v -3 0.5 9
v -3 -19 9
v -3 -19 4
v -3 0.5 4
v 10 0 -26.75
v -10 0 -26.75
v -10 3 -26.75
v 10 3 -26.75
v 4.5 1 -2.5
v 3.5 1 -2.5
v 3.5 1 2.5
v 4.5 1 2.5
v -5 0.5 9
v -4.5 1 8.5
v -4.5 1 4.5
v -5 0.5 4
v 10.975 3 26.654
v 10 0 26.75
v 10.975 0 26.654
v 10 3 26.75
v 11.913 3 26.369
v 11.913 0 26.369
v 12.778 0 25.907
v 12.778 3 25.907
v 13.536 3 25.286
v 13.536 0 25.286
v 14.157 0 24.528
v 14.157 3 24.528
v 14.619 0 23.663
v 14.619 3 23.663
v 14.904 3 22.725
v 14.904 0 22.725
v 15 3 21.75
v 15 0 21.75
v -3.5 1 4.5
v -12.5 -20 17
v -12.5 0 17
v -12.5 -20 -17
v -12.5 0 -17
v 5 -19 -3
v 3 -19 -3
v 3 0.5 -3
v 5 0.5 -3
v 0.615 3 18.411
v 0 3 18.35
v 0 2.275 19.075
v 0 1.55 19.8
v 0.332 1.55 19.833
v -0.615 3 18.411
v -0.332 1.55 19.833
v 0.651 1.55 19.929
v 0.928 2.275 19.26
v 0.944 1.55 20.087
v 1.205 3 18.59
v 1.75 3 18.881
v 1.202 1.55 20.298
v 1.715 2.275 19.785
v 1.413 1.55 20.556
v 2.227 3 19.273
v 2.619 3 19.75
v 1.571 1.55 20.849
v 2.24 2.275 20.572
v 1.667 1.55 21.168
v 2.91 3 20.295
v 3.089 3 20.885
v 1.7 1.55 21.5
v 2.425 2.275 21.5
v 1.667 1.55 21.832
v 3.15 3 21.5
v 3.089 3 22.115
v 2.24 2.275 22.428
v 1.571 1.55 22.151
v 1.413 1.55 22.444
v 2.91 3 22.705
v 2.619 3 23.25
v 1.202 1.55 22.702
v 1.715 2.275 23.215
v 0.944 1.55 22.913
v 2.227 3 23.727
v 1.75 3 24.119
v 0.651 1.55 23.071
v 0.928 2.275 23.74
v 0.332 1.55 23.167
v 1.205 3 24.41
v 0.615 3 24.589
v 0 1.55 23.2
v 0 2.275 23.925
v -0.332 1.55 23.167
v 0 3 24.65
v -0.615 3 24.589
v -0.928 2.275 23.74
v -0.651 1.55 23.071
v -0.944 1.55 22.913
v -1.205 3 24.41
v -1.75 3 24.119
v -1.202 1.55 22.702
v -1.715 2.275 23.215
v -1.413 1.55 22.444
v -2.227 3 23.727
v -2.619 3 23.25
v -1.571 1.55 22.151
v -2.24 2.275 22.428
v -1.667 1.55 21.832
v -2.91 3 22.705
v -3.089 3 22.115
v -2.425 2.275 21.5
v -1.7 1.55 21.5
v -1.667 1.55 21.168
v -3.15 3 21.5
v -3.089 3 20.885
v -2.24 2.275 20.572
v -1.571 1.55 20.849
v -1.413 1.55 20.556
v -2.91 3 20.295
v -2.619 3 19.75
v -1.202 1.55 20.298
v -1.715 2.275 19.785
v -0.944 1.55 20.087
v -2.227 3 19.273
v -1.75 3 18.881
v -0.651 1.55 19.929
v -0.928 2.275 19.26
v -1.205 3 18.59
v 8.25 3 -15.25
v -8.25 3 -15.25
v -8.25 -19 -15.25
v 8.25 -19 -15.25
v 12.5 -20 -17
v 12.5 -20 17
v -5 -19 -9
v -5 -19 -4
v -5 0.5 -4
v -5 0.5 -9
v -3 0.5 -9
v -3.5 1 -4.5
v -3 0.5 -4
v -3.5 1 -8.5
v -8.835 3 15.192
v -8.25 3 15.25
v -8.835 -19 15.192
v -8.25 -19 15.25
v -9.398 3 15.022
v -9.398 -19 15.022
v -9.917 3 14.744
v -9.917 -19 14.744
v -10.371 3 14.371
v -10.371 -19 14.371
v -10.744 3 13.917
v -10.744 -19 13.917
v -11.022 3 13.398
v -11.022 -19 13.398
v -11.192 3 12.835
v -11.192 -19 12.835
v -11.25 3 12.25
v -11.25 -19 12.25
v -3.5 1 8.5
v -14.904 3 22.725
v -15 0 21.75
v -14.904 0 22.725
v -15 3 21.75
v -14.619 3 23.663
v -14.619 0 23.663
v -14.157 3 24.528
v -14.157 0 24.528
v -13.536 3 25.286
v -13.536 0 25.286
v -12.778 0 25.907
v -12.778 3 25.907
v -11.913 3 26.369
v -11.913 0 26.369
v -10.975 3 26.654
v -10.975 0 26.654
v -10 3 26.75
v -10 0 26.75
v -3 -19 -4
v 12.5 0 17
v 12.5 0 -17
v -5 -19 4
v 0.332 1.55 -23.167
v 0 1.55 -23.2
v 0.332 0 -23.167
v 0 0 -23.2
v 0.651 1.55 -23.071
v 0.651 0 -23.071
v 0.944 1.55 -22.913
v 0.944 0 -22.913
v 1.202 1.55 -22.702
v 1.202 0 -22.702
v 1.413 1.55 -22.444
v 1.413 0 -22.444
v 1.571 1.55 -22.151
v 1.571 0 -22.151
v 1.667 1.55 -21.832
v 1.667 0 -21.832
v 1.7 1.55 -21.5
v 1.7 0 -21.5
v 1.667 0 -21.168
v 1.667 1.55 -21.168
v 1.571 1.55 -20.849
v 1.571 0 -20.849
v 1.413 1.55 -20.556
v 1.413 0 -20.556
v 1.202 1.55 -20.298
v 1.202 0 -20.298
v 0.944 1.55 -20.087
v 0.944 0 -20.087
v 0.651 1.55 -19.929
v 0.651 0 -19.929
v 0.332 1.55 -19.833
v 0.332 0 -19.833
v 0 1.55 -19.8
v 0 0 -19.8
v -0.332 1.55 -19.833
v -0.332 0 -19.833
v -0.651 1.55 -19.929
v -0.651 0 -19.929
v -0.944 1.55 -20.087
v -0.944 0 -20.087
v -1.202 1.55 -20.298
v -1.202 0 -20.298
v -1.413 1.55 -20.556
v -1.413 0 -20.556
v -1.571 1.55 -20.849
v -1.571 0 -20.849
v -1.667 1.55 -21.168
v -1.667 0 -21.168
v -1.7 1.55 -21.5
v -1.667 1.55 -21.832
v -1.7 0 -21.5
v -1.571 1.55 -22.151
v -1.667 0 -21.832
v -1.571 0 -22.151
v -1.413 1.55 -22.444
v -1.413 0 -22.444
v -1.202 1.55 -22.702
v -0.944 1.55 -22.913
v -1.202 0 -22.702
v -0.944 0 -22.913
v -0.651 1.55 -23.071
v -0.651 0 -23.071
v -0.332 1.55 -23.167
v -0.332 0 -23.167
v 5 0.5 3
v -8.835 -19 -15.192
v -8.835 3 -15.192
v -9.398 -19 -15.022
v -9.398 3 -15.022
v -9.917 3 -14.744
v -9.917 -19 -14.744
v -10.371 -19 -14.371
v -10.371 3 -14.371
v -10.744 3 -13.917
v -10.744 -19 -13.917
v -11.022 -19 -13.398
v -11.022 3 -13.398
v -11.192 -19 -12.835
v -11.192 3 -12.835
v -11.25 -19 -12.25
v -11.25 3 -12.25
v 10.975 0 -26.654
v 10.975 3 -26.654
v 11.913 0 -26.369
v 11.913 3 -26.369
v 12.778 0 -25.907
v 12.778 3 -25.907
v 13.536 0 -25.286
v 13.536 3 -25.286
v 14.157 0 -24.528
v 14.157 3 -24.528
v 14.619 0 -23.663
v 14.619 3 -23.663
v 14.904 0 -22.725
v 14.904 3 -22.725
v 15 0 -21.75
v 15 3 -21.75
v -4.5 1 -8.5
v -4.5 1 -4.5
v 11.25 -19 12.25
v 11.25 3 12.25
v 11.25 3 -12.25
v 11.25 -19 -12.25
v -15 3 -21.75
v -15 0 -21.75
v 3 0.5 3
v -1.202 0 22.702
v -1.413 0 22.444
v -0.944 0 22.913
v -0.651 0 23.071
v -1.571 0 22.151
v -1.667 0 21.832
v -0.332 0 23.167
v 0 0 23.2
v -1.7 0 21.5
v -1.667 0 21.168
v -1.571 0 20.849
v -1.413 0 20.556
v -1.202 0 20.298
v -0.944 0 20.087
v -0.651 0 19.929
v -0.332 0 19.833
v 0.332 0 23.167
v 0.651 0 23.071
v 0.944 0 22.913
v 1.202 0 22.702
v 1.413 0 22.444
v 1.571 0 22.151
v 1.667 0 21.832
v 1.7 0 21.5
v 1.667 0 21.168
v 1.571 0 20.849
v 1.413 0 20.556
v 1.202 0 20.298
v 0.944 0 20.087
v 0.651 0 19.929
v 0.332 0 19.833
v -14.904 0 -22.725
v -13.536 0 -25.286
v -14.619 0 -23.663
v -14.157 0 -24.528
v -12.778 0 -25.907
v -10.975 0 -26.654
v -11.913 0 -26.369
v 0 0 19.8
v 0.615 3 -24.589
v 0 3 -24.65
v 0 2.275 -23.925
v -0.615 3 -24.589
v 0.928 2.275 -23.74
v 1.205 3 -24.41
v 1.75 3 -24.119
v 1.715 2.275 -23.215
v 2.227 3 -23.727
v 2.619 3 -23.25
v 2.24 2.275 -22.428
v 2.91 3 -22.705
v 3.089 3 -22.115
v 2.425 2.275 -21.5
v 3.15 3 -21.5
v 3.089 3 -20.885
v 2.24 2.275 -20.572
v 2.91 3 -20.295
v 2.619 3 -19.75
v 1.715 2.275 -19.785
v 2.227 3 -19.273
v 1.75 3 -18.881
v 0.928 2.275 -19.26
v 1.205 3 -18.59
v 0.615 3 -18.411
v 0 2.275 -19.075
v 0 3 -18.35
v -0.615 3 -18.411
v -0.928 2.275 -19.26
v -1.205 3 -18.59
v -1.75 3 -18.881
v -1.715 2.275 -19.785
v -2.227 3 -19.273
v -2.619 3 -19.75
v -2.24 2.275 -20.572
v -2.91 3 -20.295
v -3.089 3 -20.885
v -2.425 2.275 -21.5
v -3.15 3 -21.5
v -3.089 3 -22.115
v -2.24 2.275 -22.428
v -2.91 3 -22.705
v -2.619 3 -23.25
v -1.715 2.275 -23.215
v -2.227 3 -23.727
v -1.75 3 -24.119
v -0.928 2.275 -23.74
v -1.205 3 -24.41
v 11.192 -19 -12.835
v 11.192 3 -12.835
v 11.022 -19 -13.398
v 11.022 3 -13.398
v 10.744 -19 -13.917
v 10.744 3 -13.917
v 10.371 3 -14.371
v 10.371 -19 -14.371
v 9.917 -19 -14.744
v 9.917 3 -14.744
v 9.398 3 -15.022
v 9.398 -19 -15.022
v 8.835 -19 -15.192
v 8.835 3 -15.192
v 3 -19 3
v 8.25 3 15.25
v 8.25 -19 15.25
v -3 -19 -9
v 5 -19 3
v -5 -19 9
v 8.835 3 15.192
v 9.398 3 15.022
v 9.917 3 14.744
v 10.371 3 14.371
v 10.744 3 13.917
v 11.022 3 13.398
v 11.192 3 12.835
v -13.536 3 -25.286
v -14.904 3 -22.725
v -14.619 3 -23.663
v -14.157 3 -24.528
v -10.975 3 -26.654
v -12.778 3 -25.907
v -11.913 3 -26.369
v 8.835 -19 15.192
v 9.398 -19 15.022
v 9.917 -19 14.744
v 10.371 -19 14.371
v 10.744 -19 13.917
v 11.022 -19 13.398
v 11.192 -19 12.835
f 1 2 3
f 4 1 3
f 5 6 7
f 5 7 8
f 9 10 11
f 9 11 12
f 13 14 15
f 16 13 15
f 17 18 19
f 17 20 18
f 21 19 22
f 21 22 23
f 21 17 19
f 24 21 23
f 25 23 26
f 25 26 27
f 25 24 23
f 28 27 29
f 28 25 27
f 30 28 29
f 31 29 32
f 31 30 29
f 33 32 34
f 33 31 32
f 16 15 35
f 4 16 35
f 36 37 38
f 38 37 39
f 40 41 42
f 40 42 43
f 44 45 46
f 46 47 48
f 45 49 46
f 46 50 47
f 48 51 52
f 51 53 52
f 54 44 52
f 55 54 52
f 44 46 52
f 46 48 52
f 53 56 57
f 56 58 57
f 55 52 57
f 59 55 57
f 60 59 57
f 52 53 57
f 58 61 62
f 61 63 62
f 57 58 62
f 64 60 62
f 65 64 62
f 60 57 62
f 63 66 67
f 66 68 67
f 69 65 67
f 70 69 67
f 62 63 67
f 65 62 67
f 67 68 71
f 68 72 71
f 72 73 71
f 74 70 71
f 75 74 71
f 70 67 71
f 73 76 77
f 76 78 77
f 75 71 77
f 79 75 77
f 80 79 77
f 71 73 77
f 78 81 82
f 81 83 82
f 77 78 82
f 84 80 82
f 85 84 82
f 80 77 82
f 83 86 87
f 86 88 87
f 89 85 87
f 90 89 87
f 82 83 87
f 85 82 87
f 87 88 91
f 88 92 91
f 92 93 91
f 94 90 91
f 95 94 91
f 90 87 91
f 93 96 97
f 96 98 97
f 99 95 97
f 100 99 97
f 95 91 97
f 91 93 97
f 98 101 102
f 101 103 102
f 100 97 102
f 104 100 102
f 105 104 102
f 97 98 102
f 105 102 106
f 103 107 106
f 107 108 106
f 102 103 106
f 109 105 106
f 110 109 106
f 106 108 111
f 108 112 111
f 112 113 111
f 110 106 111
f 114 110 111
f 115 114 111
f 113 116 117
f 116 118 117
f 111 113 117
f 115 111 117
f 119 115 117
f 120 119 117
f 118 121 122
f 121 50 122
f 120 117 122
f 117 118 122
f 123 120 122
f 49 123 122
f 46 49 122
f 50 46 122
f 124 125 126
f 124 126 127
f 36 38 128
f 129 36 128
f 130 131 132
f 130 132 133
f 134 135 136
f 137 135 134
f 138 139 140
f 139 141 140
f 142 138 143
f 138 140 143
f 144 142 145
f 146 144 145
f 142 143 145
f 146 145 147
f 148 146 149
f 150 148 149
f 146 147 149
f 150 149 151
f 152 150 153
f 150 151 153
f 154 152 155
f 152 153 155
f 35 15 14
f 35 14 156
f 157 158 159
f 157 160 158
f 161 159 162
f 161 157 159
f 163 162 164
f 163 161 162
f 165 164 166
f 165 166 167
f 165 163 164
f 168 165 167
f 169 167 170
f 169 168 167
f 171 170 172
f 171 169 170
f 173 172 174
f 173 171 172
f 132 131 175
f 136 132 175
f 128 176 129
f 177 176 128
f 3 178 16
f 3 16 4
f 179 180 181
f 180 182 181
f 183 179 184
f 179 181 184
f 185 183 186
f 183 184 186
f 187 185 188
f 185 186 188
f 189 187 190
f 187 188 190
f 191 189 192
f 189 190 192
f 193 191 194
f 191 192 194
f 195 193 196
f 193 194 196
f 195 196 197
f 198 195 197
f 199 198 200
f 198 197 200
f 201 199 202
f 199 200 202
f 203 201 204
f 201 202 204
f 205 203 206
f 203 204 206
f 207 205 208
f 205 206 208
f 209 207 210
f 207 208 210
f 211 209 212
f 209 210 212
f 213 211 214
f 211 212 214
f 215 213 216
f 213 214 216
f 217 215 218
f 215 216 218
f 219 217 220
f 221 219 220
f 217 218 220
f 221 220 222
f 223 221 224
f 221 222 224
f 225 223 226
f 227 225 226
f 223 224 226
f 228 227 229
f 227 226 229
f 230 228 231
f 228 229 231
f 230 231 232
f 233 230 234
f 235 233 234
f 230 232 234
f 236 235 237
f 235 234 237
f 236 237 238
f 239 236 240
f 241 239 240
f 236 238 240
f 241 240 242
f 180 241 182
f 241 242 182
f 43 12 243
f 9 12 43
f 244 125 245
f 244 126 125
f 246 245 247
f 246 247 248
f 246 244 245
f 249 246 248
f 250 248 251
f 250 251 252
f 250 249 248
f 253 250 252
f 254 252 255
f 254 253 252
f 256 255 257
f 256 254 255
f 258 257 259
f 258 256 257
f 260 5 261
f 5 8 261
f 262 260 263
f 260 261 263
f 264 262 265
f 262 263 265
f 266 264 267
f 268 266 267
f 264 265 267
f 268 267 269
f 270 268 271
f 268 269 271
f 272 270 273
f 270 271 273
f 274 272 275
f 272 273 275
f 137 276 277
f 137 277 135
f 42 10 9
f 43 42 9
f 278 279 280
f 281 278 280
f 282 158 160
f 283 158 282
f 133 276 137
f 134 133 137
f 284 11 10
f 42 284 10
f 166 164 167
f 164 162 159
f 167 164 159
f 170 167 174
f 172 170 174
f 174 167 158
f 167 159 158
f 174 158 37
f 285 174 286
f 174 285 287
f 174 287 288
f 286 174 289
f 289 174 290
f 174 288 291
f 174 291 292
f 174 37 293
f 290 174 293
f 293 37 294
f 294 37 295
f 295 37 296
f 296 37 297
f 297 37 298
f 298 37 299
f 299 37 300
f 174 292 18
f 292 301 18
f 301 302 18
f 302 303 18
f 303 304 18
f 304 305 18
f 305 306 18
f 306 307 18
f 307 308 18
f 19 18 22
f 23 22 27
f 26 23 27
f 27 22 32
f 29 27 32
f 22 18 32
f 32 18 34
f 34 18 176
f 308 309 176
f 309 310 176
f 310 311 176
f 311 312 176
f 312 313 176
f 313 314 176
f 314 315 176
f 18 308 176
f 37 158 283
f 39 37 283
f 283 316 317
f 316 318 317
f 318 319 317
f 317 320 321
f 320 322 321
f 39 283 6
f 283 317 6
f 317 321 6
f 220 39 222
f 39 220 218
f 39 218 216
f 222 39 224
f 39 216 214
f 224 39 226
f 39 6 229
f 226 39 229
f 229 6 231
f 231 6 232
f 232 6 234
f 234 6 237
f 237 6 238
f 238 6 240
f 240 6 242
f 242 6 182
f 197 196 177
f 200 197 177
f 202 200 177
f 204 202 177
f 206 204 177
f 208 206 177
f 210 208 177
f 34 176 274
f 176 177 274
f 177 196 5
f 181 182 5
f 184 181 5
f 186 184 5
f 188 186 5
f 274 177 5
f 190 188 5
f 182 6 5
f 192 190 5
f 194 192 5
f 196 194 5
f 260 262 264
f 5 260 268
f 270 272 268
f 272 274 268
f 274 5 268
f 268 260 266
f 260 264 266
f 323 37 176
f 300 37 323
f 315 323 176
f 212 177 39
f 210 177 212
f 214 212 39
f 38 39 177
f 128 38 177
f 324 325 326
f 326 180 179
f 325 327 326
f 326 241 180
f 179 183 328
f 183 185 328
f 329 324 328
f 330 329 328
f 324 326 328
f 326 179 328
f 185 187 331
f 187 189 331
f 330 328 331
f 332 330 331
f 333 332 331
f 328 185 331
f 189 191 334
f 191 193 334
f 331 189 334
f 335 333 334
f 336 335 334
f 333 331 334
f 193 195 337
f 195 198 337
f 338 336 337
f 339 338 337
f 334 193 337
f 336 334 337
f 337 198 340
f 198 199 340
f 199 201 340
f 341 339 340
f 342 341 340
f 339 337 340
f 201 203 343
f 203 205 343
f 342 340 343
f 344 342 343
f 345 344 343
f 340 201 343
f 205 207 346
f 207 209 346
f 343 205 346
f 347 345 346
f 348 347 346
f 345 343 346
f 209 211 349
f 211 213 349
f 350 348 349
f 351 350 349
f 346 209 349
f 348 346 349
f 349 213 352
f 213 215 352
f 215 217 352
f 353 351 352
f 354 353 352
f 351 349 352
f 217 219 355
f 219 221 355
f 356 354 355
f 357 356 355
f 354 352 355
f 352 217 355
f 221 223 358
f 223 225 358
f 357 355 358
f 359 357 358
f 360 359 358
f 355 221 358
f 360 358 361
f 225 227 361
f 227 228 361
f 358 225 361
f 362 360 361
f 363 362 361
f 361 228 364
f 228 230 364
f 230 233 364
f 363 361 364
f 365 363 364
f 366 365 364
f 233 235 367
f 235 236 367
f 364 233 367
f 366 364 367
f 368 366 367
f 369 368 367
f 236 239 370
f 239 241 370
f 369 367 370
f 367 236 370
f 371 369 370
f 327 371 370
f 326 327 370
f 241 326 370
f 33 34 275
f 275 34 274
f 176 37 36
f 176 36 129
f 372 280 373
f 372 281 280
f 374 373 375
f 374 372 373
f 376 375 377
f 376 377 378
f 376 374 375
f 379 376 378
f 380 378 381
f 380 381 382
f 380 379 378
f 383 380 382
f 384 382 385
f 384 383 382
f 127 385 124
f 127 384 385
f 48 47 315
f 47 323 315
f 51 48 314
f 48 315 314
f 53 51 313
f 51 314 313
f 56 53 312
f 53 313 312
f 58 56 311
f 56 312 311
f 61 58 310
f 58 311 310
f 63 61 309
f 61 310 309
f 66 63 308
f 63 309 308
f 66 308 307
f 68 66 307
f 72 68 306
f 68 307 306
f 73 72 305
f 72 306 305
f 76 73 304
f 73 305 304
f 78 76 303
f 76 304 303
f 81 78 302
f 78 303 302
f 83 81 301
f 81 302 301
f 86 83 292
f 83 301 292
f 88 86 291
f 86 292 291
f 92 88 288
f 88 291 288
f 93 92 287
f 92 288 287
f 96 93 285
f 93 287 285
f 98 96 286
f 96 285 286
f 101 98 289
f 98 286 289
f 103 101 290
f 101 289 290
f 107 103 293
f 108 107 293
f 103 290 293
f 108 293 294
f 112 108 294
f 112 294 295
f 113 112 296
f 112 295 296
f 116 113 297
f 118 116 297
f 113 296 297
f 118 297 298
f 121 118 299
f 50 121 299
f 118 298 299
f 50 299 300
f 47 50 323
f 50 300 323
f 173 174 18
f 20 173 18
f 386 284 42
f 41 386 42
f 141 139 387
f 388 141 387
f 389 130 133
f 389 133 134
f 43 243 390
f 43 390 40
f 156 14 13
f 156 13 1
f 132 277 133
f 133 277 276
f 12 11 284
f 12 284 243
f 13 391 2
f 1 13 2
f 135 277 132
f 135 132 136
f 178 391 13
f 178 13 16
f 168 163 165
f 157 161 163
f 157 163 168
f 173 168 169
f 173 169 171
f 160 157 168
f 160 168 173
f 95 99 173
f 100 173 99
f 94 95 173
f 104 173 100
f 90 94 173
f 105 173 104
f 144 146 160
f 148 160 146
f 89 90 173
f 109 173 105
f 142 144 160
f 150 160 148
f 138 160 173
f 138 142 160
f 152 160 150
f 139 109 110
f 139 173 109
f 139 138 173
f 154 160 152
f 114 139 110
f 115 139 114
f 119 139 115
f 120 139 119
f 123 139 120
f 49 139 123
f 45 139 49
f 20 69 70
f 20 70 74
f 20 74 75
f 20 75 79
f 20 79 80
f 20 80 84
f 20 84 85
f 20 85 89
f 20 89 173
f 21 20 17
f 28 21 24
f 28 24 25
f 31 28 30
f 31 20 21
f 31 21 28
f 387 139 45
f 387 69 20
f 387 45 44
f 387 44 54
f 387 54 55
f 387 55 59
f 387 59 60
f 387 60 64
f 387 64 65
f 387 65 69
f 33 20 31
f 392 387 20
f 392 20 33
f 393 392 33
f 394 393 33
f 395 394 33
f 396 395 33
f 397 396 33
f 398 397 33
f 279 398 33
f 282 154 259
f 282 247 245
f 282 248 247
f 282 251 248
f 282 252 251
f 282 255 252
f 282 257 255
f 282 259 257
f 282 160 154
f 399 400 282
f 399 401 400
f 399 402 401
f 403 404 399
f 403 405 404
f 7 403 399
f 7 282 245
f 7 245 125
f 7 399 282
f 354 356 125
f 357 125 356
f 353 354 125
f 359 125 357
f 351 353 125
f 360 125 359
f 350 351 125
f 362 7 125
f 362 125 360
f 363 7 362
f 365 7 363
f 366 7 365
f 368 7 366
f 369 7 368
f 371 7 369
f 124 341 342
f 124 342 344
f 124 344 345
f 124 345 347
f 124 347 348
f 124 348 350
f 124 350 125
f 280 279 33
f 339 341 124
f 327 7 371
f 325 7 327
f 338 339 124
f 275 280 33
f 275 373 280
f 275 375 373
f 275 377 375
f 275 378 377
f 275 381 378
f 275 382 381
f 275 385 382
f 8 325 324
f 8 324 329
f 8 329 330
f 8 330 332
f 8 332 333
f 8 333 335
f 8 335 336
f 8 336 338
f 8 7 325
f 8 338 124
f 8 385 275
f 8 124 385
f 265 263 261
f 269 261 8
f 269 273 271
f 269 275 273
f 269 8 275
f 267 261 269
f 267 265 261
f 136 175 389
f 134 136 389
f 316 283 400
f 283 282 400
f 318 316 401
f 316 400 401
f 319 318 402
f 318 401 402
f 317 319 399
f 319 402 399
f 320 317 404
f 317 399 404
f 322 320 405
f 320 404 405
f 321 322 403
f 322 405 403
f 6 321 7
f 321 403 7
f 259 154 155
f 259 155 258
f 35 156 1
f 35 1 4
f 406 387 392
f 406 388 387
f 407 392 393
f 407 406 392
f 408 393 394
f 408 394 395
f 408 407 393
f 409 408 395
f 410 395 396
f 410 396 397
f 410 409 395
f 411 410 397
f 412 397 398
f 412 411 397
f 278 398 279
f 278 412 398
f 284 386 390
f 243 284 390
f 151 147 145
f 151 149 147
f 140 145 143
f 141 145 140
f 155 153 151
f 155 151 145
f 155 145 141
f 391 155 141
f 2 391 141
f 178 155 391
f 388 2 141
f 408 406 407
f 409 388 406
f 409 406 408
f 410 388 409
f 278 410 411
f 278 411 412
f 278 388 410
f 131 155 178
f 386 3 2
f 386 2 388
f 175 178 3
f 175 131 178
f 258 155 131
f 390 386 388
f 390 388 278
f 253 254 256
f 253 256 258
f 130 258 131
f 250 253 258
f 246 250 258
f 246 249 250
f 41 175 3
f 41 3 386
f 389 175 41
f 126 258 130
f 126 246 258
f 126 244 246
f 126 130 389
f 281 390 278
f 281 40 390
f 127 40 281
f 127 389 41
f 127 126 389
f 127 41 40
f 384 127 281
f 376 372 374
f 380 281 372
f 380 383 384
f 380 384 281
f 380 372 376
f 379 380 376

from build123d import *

# Parameters (mm, degrees)
SKETCH1_W                                       = 25
SKETCH1_H                                       = 34
BOSS_EXTRUDE1_DEPTH                             = 20
SKETCH2_W                                       = 30
SKETCH2_H                                       = 53.5
BOSS_EXTRUDE2_DEPTH                             = 3
FILLET1_R                                       = 5
SKETCH3_W                                       = 22.5
SKETCH3_H                                       = 30.5
CUT_EXTRUDE1_DEPTH                              = 22
FILLET2_R                                       = 3
SKETCH4_W                                       = 2
SKETCH4_H                                       = 6
SKETCH4_H_2                                     = 5
BOSS_EXTRUDE3_DEPTH                             = 20
CHAMFER1_SIZE                                   = 0.5
CSK_FOR_M3_FLAT_HEAD_MACHINE_SCREW1_D           = 3.4
CSK_FOR_M3_FLAT_HEAD_MACHINE_SCREW1_DEPTH       = 3
CSK_FOR_M3_FLAT_HEAD_MACHINE_SCREW1_CSINK_D     = 6.3
CSK_FOR_M3_FLAT_HEAD_MACHINE_SCREW1_CSINK_ANGLE = 90
CSK_FOR_M3_FLAT_HEAD_MACHINE_SCREW1_TIP         = 1.021463052


with BuildPart() as part:
    # Sketch1 → Boss-Extrude1 (new body)
    with BuildSketch(Plane(origin=(0, 0, 0), x_dir=(1, 0, 0), z_dir=(0, 1, 0))):
        Rectangle(SKETCH1_W, SKETCH1_H)
    extrude(amount=-BOSS_EXTRUDE1_DEPTH)

    # Sketch2 → Boss-Extrude2 (add)
    with BuildSketch(Plane(origin=(0, 0, 0), x_dir=(1, 0, 0), z_dir=(0, 1, 0))):
        Rectangle(SKETCH2_W, SKETCH2_H)
    extrude(amount=BOSS_EXTRUDE2_DEPTH)

    # Fillet1
    fillet1_edges = [part.edges().sort_by_distance(p)[0] for p in [
        (15, 1.5, 26.75),
        (15, 1.5, -26.75),
        (-15, 1.5, -26.75),
        (-15, 1.5, 26.75),
    ]]
    fillet(fillet1_edges, radius=FILLET1_R)

    # Sketch3 → Cut-Extrude1 (cut)
    with BuildSketch(Plane(origin=(0, 3, 0), x_dir=(1, 0, 0), z_dir=(0, 1, 0))):
        Rectangle(SKETCH3_W, SKETCH3_H)
    extrude(amount=-CUT_EXTRUDE1_DEPTH, mode=Mode.SUBTRACT)

    # Fillet2
    fillet2_edges = [part.edges().sort_by_distance(p)[0] for p in [
        (11.25, -8, -15.25),
        (11.25, -8, 15.25),
        (-11.25, -8, 15.25),
        (-11.25, -8, -15.25),
    ]]
    fillet(fillet2_edges, radius=FILLET2_R)

    # Sketch4 → Boss-Extrude3 (add)
    with BuildSketch(Plane(origin=(0, -19, 0), x_dir=(1, 0, 0), z_dir=(0, 1, 0))):
        with Locations((4, 0)):
            Rectangle(SKETCH4_W, SKETCH4_H)
        with Locations((-4, 6.5)):
            Rectangle(SKETCH4_W, SKETCH4_H_2)
        with Locations((-4, -6.5)):
            Rectangle(SKETCH4_W, SKETCH4_H_2)
    extrude(amount=BOSS_EXTRUDE3_DEPTH)

    # Chamfer1
    chamfer1_edges = [part.edges().sort_by_distance(p)[0] for p in [
        (-3, 1, -6.5),
        (-4, 1, -9),
        (-5, 1, -6.5),
        (-4, 1, -4),
        (-5, 1, 6.5),
        (-4, 1, 9),
        (-3, 1, 6.5),
        (-4, 1, 4),
        (5, 1, 0),
        (4, 1, -3),
        (3, 1, 0),
        (4, 1, 3),
    ]]
    chamfer(chamfer1_edges, length=CHAMFER1_SIZE)

    # CSK for M3 Flat Head Machine Screw1
    with Locations(Plane(origin=(0, 3, -21.5), x_dir=(0, 0, 1), z_dir=(0, 1, 0))):
        with Locations((0, 0), (43, 0)):
            CounterSinkHole(CSK_FOR_M3_FLAT_HEAD_MACHINE_SCREW1_D / 2, CSK_FOR_M3_FLAT_HEAD_MACHINE_SCREW1_CSINK_D / 2, depth=CSK_FOR_M3_FLAT_HEAD_MACHINE_SCREW1_DEPTH, counter_sink_angle=CSK_FOR_M3_FLAT_HEAD_MACHINE_SCREW1_CSINK_ANGLE)
            with Locations((0, 0, -(CSK_FOR_M3_FLAT_HEAD_MACHINE_SCREW1_DEPTH + CSK_FOR_M3_FLAT_HEAD_MACHINE_SCREW1_TIP / 2))):  # 118° drill point
                Cone(0, CSK_FOR_M3_FLAT_HEAD_MACHINE_SCREW1_D / 2, CSK_FOR_M3_FLAT_HEAD_MACHINE_SCREW1_TIP, mode=Mode.SUBTRACT)


solid = part.part
